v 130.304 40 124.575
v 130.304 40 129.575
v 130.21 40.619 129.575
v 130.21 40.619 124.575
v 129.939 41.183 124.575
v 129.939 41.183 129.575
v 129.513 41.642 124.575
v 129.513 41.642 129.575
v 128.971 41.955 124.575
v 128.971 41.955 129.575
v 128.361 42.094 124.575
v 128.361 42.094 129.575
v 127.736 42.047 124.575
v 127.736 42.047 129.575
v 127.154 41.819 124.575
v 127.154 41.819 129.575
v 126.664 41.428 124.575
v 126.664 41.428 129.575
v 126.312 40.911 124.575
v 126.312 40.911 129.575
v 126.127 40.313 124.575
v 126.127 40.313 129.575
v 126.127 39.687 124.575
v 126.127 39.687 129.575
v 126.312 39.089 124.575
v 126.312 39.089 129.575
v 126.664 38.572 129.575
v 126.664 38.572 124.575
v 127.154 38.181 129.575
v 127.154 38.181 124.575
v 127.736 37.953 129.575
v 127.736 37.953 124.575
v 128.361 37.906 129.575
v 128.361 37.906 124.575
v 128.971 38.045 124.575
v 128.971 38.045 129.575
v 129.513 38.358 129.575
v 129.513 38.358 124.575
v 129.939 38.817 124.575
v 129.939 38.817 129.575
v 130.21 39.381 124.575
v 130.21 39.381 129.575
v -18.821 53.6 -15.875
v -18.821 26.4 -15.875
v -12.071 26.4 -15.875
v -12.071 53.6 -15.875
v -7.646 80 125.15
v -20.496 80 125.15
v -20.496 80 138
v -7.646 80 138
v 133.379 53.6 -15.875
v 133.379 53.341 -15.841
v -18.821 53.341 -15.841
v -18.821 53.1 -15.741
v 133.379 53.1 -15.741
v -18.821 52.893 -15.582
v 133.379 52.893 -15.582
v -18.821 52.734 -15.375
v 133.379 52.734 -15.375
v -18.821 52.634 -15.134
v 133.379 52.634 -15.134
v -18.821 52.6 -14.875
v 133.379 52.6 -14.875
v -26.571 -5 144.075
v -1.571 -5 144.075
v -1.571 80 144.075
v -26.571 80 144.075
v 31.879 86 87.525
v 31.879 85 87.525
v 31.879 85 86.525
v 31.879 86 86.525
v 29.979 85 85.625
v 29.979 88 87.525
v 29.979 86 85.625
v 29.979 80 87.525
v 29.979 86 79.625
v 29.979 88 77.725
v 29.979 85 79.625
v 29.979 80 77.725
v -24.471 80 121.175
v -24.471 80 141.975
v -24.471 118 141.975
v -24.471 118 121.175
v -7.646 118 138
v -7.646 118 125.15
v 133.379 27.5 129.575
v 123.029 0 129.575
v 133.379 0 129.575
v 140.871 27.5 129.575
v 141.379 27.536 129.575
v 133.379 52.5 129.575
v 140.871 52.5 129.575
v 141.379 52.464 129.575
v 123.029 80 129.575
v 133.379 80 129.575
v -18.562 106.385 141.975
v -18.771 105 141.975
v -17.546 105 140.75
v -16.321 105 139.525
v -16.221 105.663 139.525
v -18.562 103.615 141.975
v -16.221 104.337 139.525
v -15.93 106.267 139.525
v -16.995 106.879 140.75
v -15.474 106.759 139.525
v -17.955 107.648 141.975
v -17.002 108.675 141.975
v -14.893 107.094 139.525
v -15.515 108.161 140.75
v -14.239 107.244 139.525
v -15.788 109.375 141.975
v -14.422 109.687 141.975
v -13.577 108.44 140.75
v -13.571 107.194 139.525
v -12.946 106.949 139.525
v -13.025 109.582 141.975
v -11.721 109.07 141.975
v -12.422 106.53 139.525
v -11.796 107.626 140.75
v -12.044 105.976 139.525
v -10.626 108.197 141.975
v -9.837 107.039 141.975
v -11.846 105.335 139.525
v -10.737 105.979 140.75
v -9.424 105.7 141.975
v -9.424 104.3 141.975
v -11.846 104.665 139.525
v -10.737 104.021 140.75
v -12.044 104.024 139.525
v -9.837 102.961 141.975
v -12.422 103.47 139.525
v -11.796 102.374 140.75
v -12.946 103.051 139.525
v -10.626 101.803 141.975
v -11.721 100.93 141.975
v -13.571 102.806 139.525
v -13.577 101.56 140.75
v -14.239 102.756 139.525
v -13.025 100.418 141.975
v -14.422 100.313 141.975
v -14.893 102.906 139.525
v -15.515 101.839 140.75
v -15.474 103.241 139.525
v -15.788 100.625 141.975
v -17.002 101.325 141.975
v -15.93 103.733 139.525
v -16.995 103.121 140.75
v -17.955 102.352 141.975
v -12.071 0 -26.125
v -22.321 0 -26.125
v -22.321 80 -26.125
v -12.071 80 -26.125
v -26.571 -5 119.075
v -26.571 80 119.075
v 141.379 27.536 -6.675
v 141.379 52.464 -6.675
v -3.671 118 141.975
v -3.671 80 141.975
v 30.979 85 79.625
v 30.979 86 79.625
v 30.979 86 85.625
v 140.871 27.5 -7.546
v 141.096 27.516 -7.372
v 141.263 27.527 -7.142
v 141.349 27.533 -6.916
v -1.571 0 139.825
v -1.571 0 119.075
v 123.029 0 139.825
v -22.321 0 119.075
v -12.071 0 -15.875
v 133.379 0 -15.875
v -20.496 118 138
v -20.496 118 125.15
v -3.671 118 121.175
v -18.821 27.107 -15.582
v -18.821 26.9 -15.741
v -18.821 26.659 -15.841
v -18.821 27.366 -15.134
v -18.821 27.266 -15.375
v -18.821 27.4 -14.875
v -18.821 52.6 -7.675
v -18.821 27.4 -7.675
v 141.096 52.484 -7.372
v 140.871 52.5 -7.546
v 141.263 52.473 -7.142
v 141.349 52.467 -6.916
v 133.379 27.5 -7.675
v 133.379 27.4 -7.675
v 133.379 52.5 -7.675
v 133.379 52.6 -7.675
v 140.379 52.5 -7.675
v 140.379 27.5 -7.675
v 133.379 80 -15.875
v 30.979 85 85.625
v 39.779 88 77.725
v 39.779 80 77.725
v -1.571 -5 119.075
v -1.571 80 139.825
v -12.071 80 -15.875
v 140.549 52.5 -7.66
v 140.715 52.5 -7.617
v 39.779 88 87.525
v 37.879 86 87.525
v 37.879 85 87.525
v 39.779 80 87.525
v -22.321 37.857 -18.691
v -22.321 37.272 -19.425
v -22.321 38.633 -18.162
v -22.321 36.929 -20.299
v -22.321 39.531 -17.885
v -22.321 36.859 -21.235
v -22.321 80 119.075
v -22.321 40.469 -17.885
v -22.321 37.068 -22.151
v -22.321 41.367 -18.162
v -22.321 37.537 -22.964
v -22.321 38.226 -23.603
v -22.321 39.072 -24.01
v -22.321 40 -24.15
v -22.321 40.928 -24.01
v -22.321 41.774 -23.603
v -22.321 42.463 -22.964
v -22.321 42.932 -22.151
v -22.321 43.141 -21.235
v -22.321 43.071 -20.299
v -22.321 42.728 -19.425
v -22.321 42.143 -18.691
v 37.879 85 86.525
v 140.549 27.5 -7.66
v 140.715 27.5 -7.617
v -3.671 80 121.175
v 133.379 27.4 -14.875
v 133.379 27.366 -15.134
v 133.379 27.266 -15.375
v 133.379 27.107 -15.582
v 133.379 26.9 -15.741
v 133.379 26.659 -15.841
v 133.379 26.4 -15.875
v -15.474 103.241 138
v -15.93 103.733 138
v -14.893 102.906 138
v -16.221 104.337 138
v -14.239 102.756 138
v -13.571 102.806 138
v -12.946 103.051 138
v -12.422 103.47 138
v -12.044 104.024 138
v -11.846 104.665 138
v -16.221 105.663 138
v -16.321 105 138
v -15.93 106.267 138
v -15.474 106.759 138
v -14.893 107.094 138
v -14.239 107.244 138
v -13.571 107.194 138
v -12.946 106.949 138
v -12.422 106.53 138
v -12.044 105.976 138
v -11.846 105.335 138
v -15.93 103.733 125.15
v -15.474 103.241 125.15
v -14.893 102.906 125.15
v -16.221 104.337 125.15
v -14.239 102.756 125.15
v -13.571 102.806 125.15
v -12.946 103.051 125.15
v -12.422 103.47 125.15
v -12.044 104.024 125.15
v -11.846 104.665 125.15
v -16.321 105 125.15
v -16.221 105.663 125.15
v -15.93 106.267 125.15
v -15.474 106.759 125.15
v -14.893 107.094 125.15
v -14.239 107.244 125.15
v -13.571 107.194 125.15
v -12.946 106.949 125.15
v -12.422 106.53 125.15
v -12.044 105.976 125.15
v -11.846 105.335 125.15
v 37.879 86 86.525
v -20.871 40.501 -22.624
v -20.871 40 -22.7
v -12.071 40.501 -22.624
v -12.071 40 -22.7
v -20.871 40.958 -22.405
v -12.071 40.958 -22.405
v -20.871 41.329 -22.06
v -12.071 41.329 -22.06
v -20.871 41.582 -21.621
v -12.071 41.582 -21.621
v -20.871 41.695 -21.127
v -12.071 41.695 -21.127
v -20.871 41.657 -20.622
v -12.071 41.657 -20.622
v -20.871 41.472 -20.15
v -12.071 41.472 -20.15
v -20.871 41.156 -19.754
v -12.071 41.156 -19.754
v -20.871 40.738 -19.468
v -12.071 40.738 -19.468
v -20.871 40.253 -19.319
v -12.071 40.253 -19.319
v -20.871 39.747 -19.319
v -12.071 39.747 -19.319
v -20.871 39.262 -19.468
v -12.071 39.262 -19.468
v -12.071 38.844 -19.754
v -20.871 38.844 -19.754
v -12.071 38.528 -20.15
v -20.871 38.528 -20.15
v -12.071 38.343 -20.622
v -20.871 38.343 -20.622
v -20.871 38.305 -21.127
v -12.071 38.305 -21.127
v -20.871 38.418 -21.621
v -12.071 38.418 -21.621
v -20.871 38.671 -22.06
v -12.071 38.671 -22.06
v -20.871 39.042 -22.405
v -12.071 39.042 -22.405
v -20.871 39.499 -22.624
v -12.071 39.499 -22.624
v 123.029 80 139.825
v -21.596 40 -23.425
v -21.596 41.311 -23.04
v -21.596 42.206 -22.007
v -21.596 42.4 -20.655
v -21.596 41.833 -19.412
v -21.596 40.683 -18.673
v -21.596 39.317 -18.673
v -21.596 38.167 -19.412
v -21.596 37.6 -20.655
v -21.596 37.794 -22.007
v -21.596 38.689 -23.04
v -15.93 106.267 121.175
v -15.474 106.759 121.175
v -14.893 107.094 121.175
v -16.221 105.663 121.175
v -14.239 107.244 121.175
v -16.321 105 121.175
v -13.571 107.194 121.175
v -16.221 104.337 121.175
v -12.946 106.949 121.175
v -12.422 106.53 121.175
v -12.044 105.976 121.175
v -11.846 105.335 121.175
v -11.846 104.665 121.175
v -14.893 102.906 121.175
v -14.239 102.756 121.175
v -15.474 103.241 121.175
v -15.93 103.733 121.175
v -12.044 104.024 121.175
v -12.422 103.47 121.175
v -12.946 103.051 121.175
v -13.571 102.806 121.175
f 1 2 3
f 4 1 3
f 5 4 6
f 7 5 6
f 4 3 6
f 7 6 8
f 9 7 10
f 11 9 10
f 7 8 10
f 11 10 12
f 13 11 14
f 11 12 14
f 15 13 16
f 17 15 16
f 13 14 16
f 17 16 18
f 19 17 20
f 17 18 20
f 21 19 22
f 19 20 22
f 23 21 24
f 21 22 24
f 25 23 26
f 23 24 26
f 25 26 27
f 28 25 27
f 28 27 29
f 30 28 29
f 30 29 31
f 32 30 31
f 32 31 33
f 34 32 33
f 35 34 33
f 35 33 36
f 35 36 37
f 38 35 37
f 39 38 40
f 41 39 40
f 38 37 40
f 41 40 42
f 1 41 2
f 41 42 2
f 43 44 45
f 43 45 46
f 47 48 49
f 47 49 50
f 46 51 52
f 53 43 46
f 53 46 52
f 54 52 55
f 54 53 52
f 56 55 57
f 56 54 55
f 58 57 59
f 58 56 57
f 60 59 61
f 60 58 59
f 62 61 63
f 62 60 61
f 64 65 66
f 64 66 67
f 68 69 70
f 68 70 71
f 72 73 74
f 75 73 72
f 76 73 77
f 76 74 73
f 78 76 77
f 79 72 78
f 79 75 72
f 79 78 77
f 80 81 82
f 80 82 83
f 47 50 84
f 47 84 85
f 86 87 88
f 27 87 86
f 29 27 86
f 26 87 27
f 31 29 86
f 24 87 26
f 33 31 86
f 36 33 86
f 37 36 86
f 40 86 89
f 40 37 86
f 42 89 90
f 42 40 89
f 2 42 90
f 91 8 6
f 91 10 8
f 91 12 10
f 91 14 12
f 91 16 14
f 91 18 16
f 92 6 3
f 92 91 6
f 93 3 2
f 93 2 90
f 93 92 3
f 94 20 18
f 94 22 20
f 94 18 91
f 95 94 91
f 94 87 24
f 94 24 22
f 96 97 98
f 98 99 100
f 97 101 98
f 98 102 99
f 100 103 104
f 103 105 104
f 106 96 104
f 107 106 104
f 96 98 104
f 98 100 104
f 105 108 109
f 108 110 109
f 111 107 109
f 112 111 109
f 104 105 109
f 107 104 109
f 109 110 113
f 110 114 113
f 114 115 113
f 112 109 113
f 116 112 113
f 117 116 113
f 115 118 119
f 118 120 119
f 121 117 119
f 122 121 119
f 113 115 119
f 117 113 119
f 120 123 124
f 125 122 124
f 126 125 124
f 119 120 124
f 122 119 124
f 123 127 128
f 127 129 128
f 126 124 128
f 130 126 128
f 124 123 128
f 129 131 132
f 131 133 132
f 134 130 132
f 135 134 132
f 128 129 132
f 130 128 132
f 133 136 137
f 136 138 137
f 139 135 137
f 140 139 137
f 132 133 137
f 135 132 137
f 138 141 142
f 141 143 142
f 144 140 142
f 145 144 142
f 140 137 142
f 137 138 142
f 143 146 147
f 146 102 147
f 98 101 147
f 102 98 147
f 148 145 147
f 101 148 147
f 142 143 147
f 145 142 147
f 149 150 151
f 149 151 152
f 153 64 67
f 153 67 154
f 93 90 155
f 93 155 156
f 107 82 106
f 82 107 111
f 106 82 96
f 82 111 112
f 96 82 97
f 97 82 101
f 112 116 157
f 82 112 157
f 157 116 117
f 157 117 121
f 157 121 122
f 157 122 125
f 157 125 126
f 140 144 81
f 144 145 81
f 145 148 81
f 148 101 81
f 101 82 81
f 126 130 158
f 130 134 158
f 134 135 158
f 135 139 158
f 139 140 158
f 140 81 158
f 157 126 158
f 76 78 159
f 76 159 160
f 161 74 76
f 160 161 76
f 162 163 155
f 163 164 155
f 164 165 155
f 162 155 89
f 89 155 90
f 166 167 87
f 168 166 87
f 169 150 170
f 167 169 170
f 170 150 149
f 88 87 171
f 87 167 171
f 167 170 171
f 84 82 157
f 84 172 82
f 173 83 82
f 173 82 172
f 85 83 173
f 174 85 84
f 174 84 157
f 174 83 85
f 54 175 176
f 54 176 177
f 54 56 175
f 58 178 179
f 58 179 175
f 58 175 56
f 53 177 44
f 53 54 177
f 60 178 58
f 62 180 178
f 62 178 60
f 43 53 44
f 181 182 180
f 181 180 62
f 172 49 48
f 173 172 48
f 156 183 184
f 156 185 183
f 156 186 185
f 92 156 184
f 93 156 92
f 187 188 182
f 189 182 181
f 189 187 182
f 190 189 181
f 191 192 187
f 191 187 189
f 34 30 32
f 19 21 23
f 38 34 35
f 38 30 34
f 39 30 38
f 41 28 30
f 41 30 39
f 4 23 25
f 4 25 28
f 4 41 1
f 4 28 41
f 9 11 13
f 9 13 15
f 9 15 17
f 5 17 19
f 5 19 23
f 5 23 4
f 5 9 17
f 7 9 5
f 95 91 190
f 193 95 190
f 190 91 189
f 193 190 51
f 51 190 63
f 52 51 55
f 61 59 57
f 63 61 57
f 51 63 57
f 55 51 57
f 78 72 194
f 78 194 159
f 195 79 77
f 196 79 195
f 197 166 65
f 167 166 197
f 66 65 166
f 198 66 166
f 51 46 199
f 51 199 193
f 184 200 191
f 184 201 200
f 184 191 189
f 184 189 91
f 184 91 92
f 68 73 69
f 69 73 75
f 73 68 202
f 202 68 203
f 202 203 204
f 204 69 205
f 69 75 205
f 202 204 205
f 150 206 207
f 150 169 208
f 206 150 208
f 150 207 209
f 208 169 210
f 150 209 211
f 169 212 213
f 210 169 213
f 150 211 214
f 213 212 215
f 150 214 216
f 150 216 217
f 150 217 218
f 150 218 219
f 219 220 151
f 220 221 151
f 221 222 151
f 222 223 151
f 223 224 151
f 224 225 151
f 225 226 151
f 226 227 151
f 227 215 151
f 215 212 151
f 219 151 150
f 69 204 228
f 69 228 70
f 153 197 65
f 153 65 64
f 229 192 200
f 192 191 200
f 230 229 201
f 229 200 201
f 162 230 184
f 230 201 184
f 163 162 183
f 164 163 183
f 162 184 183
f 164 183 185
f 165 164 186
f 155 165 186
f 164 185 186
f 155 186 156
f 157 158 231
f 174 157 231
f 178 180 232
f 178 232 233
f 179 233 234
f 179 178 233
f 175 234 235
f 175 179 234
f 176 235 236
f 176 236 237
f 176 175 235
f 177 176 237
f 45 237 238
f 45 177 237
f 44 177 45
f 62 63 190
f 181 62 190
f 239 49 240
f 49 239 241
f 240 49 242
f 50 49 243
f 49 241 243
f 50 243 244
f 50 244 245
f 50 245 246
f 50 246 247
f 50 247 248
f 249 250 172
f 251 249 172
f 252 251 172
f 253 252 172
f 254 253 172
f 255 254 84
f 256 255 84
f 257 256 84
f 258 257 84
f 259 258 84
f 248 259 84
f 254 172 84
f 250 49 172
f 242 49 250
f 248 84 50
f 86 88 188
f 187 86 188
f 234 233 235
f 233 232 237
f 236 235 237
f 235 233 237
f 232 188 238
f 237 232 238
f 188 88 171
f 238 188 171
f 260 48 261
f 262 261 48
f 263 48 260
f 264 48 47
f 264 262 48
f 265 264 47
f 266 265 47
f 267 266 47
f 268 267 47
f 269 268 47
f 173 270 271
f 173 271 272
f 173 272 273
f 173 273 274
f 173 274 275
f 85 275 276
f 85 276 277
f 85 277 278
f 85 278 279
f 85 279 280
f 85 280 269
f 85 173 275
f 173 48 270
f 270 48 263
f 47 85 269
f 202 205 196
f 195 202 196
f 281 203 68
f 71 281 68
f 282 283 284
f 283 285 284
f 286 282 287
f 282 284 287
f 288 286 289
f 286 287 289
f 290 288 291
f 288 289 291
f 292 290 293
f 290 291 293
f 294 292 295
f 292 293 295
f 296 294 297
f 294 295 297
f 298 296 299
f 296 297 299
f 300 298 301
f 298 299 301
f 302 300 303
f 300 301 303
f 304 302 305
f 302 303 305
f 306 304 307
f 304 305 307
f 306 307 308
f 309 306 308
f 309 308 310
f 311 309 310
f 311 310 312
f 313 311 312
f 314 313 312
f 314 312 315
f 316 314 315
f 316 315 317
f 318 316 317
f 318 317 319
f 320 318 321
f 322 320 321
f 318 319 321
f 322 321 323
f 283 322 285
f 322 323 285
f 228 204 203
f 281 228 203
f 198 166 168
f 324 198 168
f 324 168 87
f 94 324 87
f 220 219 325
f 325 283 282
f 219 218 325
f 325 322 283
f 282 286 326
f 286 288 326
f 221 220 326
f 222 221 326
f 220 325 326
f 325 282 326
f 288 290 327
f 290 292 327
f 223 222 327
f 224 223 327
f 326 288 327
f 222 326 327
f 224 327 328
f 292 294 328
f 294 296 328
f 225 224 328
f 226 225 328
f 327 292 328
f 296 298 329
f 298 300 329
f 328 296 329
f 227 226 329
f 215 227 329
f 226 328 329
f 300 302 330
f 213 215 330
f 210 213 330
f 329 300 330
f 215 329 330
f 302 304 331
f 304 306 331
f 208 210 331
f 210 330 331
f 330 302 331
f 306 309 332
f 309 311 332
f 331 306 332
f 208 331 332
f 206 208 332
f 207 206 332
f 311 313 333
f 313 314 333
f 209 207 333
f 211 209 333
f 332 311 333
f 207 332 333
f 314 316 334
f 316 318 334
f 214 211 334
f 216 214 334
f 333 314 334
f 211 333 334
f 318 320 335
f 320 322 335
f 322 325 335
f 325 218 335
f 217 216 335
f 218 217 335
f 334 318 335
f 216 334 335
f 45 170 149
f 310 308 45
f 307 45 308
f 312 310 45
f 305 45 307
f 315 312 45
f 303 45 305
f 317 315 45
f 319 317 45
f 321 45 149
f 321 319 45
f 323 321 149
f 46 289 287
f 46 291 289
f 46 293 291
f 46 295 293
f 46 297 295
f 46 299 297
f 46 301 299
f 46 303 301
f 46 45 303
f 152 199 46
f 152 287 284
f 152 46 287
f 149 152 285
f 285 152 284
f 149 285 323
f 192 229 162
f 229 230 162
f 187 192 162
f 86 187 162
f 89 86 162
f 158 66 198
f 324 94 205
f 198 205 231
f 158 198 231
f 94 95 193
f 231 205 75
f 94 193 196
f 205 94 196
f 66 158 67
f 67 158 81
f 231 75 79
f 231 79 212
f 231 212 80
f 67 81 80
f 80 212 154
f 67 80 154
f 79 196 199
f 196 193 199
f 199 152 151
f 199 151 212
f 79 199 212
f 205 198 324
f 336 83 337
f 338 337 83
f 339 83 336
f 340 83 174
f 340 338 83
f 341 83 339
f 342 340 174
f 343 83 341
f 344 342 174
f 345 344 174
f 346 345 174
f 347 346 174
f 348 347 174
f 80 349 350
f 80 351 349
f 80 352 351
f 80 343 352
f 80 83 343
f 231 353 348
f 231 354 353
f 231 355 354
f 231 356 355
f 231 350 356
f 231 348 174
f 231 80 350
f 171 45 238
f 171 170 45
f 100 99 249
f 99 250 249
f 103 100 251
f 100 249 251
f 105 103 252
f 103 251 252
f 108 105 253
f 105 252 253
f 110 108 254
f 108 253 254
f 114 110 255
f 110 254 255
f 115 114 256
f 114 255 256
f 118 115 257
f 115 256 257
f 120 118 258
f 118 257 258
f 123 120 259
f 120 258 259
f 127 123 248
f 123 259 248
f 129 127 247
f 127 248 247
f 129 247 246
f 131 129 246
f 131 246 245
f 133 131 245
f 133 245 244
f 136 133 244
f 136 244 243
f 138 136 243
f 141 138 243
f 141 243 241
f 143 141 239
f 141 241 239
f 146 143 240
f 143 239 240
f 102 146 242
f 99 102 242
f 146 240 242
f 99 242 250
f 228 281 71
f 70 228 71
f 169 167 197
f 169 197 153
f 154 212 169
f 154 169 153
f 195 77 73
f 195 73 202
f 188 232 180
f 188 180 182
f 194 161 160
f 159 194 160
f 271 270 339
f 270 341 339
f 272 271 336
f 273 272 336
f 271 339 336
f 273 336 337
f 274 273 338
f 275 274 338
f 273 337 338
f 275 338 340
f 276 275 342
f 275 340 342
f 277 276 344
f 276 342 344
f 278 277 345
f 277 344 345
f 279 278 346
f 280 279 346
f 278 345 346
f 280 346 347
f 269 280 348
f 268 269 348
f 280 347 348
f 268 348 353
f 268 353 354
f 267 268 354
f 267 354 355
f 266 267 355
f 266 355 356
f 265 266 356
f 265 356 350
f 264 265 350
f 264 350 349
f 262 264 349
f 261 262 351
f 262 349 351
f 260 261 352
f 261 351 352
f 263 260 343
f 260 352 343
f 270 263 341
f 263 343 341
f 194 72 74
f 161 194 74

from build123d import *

# Parameters (mm, degrees)
SKETCH1_W                                           = 155.7
SKETCH1_H                                           = 155.7
BOSS_EXTRUDE2_DEPTH                                 = 80
SKETCH3_W                                           = 8
SKETCH3_H                                           = 25
BOSS_EXTRUDE4_DEPTH                                 = 145.45
CHAMFER1_SIZE                                       = 0.508
CHAMFER1_SIZE2                                      = 0.03552282
CHAMFER2_SIZE                                       = 0.508
CHAMFER2_SIZE2                                      = 0.03552282
SKETCH4_W                                           = 8.2
SKETCH4_H                                           = 25.2
CUT_EXTRUDE6_DEPTH                                  = 160.2
FILLET1_R                                           = 1
SKETCH6_W                                           = 10.35
SKETCH6_H                                           = 10.25
CUT_EXTRUDE7_DEPTH                                  = 80
SKETCH7_W                                           = 10.25
SKETCH7_H                                           = 10.25
BOSS_EXTRUDE5_DEPTH                                 = 80
CSK_FOR_M3_COUNTERSUNK_FLAT_HEAD_SCREW1_D           = 3.4
CSK_FOR_M3_COUNTERSUNK_FLAT_HEAD_SCREW1_DEPTH       = 16
CSK_FOR_M3_COUNTERSUNK_FLAT_HEAD_SCREW1_CSINK_D     = 6.3
CSK_FOR_M3_COUNTERSUNK_FLAT_HEAD_SCREW1_CSINK_ANGLE = 90
CSK_FOR_M3_COUNTERSUNK_FLAT_HEAD_SCREW1_TIP         = 1.021463052
SKETCH12_R                                          = 2.1
CUT_EXTRUDE9_DEPTH                                  = 5
FILLET2_START                                       = -18.821212121
FILLET2_DEPTH                                       = 152.821212121
FILLET3_START                                       = -18.821212121
FILLET3_DEPTH                                       = 152.821212121
SKETCH14_W                                          = 9.8
SKETCH14_H                                          = 9.8
BOSS_EXTRUDE6_DEPTH                                 = 8
CUT_EXTRUDE12_START                                 = -9.8
SKETCH17_W                                          = 6
SKETCH17_H                                          = 1
CUT_EXTRUDE12_DEPTH                                 = 1
CUT_EXTRUDE13_START                                 = -9.8
SKETCH19_W                                          = 6
SKETCH19_H                                          = 1
CUT_EXTRUDE13_DEPTH                                 = 1
BOSS_EXTRUDE7_DEPTH                                 = 5
BOSS_EXTRUDE7_DEPTH_BACK                            = 80
SKETCH20_W                                          = 25
SKETCH20_H                                          = 25
SKETCH21_W                                          = 20.8
SKETCH21_H                                          = 20.8
BOSS_EXTRUDE8_DEPTH                                 = 38
SKETCH23_W                                          = 12.85
SKETCH23_H                                          = 12.85
CUT_EXTRUDE14_DEPTH                                 = 38
CSK_FOR_M4_COUNTERSUNK_FLAT_HEAD_SCREW1_D           = 4.5
CSK_FOR_M4_COUNTERSUNK_FLAT_HEAD_SCREW1_DEPTH       = 26
CSK_FOR_M4_COUNTERSUNK_FLAT_HEAD_SCREW1_CSINK_D     = 9.4
CSK_FOR_M4_COUNTERSUNK_FLAT_HEAD_SCREW1_CSINK_ANGLE = 90
CSK_FOR_M4_COUNTERSUNK_FLAT_HEAD_SCREW1_TIP         = 1.351936393


with BuildPart() as part:
    # Sketch1 → Boss-Extrude2 (new body)
    with BuildSketch(Plane(origin=(0, 0, 0), x_dir=(1, 0, 0), z_dir=(0, 1, 0))):
        with Locations((55.528787879, -61.975)):
            Rectangle(SKETCH1_W, SKETCH1_H)
    extrude(amount=BOSS_EXTRUDE2_DEPTH)

    # Sketch3 → Boss-Extrude4 (add)
    with BuildSketch(Plane.XY.offset(-15.875)):
        with Locations((137.378787879, 40)):
            Rectangle(SKETCH3_W, SKETCH3_H)
    extrude(amount=BOSS_EXTRUDE4_DEPTH)

    # Chamfer1
    chamfer1_edges = [part.edges().sort_by_distance(p)[0] for p in [
        (141.378787879, 52.5, 56.85),
    ]]
    chamfer1_side = [part.faces().sort_by_distance(p)[0] for p in [
        (137.378787879, 52.5, 56.85),
    ]]
    chamfer(chamfer1_edges, length=CHAMFER1_SIZE, length2=CHAMFER1_SIZE2, reference=chamfer1_side[0])

    # Chamfer2
    chamfer2_edges = [part.edges().sort_by_distance(p)[0] for p in [
        (141.378787879, 27.5, 56.85),
    ]]
    chamfer2_side = [part.faces().sort_by_distance(p)[0] for p in [
        (137.378787879, 27.5, 56.85),
    ]]
    chamfer(chamfer2_edges, length=CHAMFER2_SIZE, length2=CHAMFER2_SIZE2, reference=chamfer2_side[0])

    # Sketch4 → Cut-Extrude6 (cut)
    with BuildSketch(Plane.ZY.offset(-141.378787879)):
        with Locations((-11.775, 40)):
            Rectangle(SKETCH4_W, SKETCH4_H)
    extrude(amount=CUT_EXTRUDE6_DEPTH, mode=Mode.SUBTRACT)

    # Fillet1
    fillet1_edges = [part.edges().sort_by_distance(p)[0] for p in [
        (141.378787879, 40, -7.675),
    ]]
    fillet(fillet1_edges, radius=FILLET1_R)

    # Sketch6 → Cut-Extrude7 (cut)
    with BuildSketch(Plane(origin=(0, 80, 0), x_dir=(1, 0, 0), z_dir=(0, 1, 0))):
        with Locations((128.203787879, -134.7)):
            Rectangle(SKETCH6_W, SKETCH6_H)
    extrude(amount=-CUT_EXTRUDE7_DEPTH, mode=Mode.SUBTRACT)

    # Sketch7 → Boss-Extrude5 (add)
    with BuildSketch(Plane(origin=(0, 80, 0), x_dir=(1, 0, 0), z_dir=(0, 1, 0))):
        with Locations((-17.196212121, 21)):
            Rectangle(SKETCH7_W, SKETCH7_H)
    extrude(amount=-BOSS_EXTRUDE5_DEPTH)

    # CSK for M3 Countersunk Flat Head Screw1
    with Locations(Plane.ZY.offset(22.321212121)):
        with Locations((-21, 40)):
            CounterSinkHole(CSK_FOR_M3_COUNTERSUNK_FLAT_HEAD_SCREW1_D / 2, CSK_FOR_M3_COUNTERSUNK_FLAT_HEAD_SCREW1_CSINK_D / 2, depth=CSK_FOR_M3_COUNTERSUNK_FLAT_HEAD_SCREW1_DEPTH, counter_sink_angle=CSK_FOR_M3_COUNTERSUNK_FLAT_HEAD_SCREW1_CSINK_ANGLE)
            with Locations((0, 0, -(CSK_FOR_M3_COUNTERSUNK_FLAT_HEAD_SCREW1_DEPTH + CSK_FOR_M3_COUNTERSUNK_FLAT_HEAD_SCREW1_TIP / 2))):  # 118° drill point
                Cone(0, CSK_FOR_M3_COUNTERSUNK_FLAT_HEAD_SCREW1_D / 2, CSK_FOR_M3_COUNTERSUNK_FLAT_HEAD_SCREW1_TIP, mode=Mode.SUBTRACT)

    # Sketch12 → Cut-Extrude9 (cut)
    with BuildSketch(Plane.XY.offset(129.575)):
        with Locations((128.203787879, 40)):
            Circle(SKETCH12_R)
    extrude(amount=-CUT_EXTRUDE9_DEPTH, mode=Mode.SUBTRACT)

    # Fillet2: read off the stored shape, not the designer's step
    # Fillet2 outline → Fillet2 (cut)
    with BuildSketch(Plane.YZ.offset(FILLET2_START)):
        with BuildLine():
            Line((52.6, -15.875), (53.6, -15.875))
            ThreePointArc((53.6, -15.875), (52.892893219, -15.582106781), (52.6, -14.875))
            Line((52.6, -14.875), (52.6, -15.875))
        make_face()
    extrude(amount=FILLET2_DEPTH, mode=Mode.SUBTRACT)

    # Fillet3: read off the stored shape, not the designer's step
    # Fillet3 outline → Fillet3 (cut)
    with BuildSketch(Plane.YZ.offset(FILLET3_START)):
        with BuildLine():
            ThreePointArc((27.4, -14.875), (27.107106781, -15.582106781), (26.4, -15.875))
            Line((26.4, -15.875), (27.4, -15.875))
            Line((27.4, -15.875), (27.4, -14.875))
        make_face()
    extrude(amount=FILLET3_DEPTH, mode=Mode.SUBTRACT)

    # Sketch14 → Boss-Extrude6 (add)
    with BuildSketch(Plane(origin=(0, 80, 0), x_dir=(1, 0, 0), z_dir=(0, 1, 0))):
        with Locations((34.878787879, -82.625)):
            Rectangle(SKETCH14_W, SKETCH14_H)
    extrude(amount=BOSS_EXTRUDE6_DEPTH)

    # Sketch17 → Cut-Extrude12 (cut)
    with BuildSketch(Plane(origin=(39.778787879, 0, 0), x_dir=(0, 0, -1), z_dir=(1, 0, 0)).offset(CUT_EXTRUDE12_START)):
        with Locations((-82.625, 85.5)):
            Rectangle(SKETCH17_W, SKETCH17_H)
    extrude(amount=CUT_EXTRUDE12_DEPTH, mode=Mode.SUBTRACT)

    # Sketch19 → Cut-Extrude13 (cut)
    with BuildSketch(Plane(origin=(0, 0, 77.725), x_dir=(-1, 0, 0), z_dir=(0, 0, -1)).offset(CUT_EXTRUDE13_START)):
        with Locations((-34.878787879, 85.5)):
            Rectangle(SKETCH19_W, SKETCH19_H)
    extrude(amount=CUT_EXTRUDE13_DEPTH, mode=Mode.SUBTRACT)

    # Sketch20 → Boss-Extrude7 (add, two sides: drawn at the far end of the back side and taken through both)
    with BuildSketch(Plane(origin=(0, 0, 0), x_dir=(-1, 0, 0), z_dir=(0, -1, 0)).offset(-BOSS_EXTRUDE7_DEPTH_BACK)):
        with Locations((14.071212121, -131.575)):
            Rectangle(SKETCH20_W, SKETCH20_H)
    extrude(amount=BOSS_EXTRUDE7_DEPTH + BOSS_EXTRUDE7_DEPTH_BACK)

    # Sketch21 → Boss-Extrude8 (add)
    with BuildSketch(Plane(origin=(0, 80, 0), x_dir=(1, 0, 0), z_dir=(0, 1, 0))):
        with Locations((-14.071212121, -131.575)):
            Rectangle(SKETCH21_W, SKETCH21_H)
    extrude(amount=BOSS_EXTRUDE8_DEPTH)

    # Sketch23 → Cut-Extrude14 (cut)
    with BuildSketch(Plane(origin=(0, 118, 0), x_dir=(1, 0, 0), z_dir=(0, 1, 0))):
        with Locations((-14.071212121, -131.575)):
            Rectangle(SKETCH23_W, SKETCH23_H)
    extrude(amount=-CUT_EXTRUDE14_DEPTH, mode=Mode.SUBTRACT)

    # CSK for M4 Countersunk Flat Head Screw1
    with Locations(Plane.XY.offset(141.975)):
        with Locations((-14.071212121, 105)):
            CounterSinkHole(CSK_FOR_M4_COUNTERSUNK_FLAT_HEAD_SCREW1_D / 2, CSK_FOR_M4_COUNTERSUNK_FLAT_HEAD_SCREW1_CSINK_D / 2, depth=CSK_FOR_M4_COUNTERSUNK_FLAT_HEAD_SCREW1_DEPTH, counter_sink_angle=CSK_FOR_M4_COUNTERSUNK_FLAT_HEAD_SCREW1_CSINK_ANGLE)
            with Locations((0, 0, -(CSK_FOR_M4_COUNTERSUNK_FLAT_HEAD_SCREW1_DEPTH + CSK_FOR_M4_COUNTERSUNK_FLAT_HEAD_SCREW1_TIP / 2))):  # 118° drill point
                Cone(0, CSK_FOR_M4_COUNTERSUNK_FLAT_HEAD_SCREW1_D / 2, CSK_FOR_M4_COUNTERSUNK_FLAT_HEAD_SCREW1_TIP, mode=Mode.SUBTRACT)


solid = part.part
